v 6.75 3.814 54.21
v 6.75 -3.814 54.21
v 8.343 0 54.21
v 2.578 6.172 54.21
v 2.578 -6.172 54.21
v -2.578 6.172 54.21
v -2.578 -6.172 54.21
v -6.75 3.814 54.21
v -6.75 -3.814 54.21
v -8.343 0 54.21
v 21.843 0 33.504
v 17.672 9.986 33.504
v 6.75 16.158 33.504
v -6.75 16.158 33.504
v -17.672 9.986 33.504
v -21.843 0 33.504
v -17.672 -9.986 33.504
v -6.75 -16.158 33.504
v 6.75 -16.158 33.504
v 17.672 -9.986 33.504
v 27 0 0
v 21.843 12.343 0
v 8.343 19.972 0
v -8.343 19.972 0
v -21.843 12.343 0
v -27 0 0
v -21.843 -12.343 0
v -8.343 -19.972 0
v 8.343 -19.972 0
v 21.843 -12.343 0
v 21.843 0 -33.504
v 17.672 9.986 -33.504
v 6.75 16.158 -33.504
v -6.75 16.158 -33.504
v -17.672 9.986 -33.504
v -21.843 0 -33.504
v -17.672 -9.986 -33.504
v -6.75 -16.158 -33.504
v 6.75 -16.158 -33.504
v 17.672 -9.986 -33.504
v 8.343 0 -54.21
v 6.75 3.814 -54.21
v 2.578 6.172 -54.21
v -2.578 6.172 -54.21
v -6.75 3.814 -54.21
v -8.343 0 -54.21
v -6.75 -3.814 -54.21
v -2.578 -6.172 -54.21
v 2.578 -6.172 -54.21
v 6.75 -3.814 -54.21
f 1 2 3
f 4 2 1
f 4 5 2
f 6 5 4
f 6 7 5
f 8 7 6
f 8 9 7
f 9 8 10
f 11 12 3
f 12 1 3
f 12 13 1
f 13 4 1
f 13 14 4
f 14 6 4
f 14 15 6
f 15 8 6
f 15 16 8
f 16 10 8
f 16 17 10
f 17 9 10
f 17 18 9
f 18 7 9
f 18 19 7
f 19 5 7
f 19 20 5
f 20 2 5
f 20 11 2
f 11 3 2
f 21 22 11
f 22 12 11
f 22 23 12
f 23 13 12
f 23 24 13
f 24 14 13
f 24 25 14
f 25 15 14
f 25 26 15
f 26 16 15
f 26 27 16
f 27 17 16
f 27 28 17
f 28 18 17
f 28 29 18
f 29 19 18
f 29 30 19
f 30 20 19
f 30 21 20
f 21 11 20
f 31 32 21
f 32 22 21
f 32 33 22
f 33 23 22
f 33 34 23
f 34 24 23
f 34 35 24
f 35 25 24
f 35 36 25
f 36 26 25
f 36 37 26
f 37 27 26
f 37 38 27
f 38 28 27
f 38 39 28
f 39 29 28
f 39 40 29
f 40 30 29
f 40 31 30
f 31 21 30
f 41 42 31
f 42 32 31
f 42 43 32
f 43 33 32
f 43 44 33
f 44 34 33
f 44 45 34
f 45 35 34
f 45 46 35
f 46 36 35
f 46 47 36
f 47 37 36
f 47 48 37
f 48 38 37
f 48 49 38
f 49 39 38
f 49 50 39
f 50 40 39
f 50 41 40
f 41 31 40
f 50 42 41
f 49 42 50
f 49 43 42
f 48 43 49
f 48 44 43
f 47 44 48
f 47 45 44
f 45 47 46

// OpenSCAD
// Generated by SolidPython 1.0.1 on 2020-07-29 00:46:48


scale(v = [9, 7, 19]) {
	sphere(r = 3);
}
/***********************************************
*********      SolidPython code:      **********
************************************************
 
# import packages: SolidPython
from solid import *
from solid.utils import *
from itertools import chain, combinations, permutations


class Resize:

    def __init__(self, scad_file):
        self.scad_file = scad_file
        #self.scad_file = import_scad(scad_file)
        # cone/cylinder param:
        self.r1 = 0
        self.r2 = 0
        self.h = 0
        # rectangular prism param:
        self.w = 0
        self.l = 0
        # ellipse param:
        self.r = 0

    # import OpenScad code (file name corresponds to shape)


    # classify shape + parameters
    def assign(self, param1, param2, param3):
        if self.scad_file == 'cone.scad':
            self.r1 = param1
            self.r2 = param2
            self.h = param3
        elif self.scad_file == 'cylinder.scad':
            self.r1 = param1
            self.r2 = param2
            self.h = param3
        elif self.scad_file == 'rectangularPrism.scad':
            self.h = param1
            self.l = param2
            self.w = param3
        else:
            self.r = param1
            self.h = param2

    # resize parameters
    def iterate(self):
        x = range(3, 20, 2)
        i = 1
        if self.scad_file == 'cone.scad':
            tempList = list(permutations(x, 2))
            for temp in tempList:
                param1 = temp[0]
                param2 = temp[1]
                filepath = 'produced_scad_files/' + 'cone' + str(param1) + '_' + str(param2) + '_' + '.scad'
                scad_render_to_file(cylinder(h=param1, r1=param2, r2=0), filepath)

        elif self.scad_file == 'cylinder.scad':
            tempList = list(permutations(x, 3))
            for temp in tempList:
                param1 = temp[0]
                param2 = temp[1]
                filepath = 'produced_scad_files/' + 'cylinder' + str(param1) + '_' + str(param2) + '_' + '.scad'
                scad_render_to_file(cylinder(h=param1, r1=param2, r2=param2), filepath)

        elif self.scad_file == 'rectangularPrism.scad':
            tempList = list(permutations(x, 3))
            for temp in tempList:
                param1 = temp[0]
                param2 = temp[1]
                param3 = temp[2]
                filepath = 'produced_scad_files/' + 'rectangularPrism' + str(param1) + '_' + str(param2) + '_' + str(
                    param3) + '.scad'
                scad_render_to_file(cube(size=(param1, param2, param3)), filepath)

        elif self.scad_file == 'ellipse.scad':
            tempList = list(permutations(x, 4))
            for temp in tempList:
                param1 = temp[0]
                param2 = temp[1]
                param3 = temp[2]
                param4 = temp[3]
                filepath = 'produced_scad_files/' + 'ellipse' + str(param1) + '_' + str(param2) + '_' + str(param3) + '_' + str(param4) + '.scad'
                scad_render_to_file(scale([param1, param2, param3])(sphere(r=param4)), filepath)

    def render_to_scadfile(self):
        scad_render_to_file(scad, 'example.scad') 
 
************************************************/
